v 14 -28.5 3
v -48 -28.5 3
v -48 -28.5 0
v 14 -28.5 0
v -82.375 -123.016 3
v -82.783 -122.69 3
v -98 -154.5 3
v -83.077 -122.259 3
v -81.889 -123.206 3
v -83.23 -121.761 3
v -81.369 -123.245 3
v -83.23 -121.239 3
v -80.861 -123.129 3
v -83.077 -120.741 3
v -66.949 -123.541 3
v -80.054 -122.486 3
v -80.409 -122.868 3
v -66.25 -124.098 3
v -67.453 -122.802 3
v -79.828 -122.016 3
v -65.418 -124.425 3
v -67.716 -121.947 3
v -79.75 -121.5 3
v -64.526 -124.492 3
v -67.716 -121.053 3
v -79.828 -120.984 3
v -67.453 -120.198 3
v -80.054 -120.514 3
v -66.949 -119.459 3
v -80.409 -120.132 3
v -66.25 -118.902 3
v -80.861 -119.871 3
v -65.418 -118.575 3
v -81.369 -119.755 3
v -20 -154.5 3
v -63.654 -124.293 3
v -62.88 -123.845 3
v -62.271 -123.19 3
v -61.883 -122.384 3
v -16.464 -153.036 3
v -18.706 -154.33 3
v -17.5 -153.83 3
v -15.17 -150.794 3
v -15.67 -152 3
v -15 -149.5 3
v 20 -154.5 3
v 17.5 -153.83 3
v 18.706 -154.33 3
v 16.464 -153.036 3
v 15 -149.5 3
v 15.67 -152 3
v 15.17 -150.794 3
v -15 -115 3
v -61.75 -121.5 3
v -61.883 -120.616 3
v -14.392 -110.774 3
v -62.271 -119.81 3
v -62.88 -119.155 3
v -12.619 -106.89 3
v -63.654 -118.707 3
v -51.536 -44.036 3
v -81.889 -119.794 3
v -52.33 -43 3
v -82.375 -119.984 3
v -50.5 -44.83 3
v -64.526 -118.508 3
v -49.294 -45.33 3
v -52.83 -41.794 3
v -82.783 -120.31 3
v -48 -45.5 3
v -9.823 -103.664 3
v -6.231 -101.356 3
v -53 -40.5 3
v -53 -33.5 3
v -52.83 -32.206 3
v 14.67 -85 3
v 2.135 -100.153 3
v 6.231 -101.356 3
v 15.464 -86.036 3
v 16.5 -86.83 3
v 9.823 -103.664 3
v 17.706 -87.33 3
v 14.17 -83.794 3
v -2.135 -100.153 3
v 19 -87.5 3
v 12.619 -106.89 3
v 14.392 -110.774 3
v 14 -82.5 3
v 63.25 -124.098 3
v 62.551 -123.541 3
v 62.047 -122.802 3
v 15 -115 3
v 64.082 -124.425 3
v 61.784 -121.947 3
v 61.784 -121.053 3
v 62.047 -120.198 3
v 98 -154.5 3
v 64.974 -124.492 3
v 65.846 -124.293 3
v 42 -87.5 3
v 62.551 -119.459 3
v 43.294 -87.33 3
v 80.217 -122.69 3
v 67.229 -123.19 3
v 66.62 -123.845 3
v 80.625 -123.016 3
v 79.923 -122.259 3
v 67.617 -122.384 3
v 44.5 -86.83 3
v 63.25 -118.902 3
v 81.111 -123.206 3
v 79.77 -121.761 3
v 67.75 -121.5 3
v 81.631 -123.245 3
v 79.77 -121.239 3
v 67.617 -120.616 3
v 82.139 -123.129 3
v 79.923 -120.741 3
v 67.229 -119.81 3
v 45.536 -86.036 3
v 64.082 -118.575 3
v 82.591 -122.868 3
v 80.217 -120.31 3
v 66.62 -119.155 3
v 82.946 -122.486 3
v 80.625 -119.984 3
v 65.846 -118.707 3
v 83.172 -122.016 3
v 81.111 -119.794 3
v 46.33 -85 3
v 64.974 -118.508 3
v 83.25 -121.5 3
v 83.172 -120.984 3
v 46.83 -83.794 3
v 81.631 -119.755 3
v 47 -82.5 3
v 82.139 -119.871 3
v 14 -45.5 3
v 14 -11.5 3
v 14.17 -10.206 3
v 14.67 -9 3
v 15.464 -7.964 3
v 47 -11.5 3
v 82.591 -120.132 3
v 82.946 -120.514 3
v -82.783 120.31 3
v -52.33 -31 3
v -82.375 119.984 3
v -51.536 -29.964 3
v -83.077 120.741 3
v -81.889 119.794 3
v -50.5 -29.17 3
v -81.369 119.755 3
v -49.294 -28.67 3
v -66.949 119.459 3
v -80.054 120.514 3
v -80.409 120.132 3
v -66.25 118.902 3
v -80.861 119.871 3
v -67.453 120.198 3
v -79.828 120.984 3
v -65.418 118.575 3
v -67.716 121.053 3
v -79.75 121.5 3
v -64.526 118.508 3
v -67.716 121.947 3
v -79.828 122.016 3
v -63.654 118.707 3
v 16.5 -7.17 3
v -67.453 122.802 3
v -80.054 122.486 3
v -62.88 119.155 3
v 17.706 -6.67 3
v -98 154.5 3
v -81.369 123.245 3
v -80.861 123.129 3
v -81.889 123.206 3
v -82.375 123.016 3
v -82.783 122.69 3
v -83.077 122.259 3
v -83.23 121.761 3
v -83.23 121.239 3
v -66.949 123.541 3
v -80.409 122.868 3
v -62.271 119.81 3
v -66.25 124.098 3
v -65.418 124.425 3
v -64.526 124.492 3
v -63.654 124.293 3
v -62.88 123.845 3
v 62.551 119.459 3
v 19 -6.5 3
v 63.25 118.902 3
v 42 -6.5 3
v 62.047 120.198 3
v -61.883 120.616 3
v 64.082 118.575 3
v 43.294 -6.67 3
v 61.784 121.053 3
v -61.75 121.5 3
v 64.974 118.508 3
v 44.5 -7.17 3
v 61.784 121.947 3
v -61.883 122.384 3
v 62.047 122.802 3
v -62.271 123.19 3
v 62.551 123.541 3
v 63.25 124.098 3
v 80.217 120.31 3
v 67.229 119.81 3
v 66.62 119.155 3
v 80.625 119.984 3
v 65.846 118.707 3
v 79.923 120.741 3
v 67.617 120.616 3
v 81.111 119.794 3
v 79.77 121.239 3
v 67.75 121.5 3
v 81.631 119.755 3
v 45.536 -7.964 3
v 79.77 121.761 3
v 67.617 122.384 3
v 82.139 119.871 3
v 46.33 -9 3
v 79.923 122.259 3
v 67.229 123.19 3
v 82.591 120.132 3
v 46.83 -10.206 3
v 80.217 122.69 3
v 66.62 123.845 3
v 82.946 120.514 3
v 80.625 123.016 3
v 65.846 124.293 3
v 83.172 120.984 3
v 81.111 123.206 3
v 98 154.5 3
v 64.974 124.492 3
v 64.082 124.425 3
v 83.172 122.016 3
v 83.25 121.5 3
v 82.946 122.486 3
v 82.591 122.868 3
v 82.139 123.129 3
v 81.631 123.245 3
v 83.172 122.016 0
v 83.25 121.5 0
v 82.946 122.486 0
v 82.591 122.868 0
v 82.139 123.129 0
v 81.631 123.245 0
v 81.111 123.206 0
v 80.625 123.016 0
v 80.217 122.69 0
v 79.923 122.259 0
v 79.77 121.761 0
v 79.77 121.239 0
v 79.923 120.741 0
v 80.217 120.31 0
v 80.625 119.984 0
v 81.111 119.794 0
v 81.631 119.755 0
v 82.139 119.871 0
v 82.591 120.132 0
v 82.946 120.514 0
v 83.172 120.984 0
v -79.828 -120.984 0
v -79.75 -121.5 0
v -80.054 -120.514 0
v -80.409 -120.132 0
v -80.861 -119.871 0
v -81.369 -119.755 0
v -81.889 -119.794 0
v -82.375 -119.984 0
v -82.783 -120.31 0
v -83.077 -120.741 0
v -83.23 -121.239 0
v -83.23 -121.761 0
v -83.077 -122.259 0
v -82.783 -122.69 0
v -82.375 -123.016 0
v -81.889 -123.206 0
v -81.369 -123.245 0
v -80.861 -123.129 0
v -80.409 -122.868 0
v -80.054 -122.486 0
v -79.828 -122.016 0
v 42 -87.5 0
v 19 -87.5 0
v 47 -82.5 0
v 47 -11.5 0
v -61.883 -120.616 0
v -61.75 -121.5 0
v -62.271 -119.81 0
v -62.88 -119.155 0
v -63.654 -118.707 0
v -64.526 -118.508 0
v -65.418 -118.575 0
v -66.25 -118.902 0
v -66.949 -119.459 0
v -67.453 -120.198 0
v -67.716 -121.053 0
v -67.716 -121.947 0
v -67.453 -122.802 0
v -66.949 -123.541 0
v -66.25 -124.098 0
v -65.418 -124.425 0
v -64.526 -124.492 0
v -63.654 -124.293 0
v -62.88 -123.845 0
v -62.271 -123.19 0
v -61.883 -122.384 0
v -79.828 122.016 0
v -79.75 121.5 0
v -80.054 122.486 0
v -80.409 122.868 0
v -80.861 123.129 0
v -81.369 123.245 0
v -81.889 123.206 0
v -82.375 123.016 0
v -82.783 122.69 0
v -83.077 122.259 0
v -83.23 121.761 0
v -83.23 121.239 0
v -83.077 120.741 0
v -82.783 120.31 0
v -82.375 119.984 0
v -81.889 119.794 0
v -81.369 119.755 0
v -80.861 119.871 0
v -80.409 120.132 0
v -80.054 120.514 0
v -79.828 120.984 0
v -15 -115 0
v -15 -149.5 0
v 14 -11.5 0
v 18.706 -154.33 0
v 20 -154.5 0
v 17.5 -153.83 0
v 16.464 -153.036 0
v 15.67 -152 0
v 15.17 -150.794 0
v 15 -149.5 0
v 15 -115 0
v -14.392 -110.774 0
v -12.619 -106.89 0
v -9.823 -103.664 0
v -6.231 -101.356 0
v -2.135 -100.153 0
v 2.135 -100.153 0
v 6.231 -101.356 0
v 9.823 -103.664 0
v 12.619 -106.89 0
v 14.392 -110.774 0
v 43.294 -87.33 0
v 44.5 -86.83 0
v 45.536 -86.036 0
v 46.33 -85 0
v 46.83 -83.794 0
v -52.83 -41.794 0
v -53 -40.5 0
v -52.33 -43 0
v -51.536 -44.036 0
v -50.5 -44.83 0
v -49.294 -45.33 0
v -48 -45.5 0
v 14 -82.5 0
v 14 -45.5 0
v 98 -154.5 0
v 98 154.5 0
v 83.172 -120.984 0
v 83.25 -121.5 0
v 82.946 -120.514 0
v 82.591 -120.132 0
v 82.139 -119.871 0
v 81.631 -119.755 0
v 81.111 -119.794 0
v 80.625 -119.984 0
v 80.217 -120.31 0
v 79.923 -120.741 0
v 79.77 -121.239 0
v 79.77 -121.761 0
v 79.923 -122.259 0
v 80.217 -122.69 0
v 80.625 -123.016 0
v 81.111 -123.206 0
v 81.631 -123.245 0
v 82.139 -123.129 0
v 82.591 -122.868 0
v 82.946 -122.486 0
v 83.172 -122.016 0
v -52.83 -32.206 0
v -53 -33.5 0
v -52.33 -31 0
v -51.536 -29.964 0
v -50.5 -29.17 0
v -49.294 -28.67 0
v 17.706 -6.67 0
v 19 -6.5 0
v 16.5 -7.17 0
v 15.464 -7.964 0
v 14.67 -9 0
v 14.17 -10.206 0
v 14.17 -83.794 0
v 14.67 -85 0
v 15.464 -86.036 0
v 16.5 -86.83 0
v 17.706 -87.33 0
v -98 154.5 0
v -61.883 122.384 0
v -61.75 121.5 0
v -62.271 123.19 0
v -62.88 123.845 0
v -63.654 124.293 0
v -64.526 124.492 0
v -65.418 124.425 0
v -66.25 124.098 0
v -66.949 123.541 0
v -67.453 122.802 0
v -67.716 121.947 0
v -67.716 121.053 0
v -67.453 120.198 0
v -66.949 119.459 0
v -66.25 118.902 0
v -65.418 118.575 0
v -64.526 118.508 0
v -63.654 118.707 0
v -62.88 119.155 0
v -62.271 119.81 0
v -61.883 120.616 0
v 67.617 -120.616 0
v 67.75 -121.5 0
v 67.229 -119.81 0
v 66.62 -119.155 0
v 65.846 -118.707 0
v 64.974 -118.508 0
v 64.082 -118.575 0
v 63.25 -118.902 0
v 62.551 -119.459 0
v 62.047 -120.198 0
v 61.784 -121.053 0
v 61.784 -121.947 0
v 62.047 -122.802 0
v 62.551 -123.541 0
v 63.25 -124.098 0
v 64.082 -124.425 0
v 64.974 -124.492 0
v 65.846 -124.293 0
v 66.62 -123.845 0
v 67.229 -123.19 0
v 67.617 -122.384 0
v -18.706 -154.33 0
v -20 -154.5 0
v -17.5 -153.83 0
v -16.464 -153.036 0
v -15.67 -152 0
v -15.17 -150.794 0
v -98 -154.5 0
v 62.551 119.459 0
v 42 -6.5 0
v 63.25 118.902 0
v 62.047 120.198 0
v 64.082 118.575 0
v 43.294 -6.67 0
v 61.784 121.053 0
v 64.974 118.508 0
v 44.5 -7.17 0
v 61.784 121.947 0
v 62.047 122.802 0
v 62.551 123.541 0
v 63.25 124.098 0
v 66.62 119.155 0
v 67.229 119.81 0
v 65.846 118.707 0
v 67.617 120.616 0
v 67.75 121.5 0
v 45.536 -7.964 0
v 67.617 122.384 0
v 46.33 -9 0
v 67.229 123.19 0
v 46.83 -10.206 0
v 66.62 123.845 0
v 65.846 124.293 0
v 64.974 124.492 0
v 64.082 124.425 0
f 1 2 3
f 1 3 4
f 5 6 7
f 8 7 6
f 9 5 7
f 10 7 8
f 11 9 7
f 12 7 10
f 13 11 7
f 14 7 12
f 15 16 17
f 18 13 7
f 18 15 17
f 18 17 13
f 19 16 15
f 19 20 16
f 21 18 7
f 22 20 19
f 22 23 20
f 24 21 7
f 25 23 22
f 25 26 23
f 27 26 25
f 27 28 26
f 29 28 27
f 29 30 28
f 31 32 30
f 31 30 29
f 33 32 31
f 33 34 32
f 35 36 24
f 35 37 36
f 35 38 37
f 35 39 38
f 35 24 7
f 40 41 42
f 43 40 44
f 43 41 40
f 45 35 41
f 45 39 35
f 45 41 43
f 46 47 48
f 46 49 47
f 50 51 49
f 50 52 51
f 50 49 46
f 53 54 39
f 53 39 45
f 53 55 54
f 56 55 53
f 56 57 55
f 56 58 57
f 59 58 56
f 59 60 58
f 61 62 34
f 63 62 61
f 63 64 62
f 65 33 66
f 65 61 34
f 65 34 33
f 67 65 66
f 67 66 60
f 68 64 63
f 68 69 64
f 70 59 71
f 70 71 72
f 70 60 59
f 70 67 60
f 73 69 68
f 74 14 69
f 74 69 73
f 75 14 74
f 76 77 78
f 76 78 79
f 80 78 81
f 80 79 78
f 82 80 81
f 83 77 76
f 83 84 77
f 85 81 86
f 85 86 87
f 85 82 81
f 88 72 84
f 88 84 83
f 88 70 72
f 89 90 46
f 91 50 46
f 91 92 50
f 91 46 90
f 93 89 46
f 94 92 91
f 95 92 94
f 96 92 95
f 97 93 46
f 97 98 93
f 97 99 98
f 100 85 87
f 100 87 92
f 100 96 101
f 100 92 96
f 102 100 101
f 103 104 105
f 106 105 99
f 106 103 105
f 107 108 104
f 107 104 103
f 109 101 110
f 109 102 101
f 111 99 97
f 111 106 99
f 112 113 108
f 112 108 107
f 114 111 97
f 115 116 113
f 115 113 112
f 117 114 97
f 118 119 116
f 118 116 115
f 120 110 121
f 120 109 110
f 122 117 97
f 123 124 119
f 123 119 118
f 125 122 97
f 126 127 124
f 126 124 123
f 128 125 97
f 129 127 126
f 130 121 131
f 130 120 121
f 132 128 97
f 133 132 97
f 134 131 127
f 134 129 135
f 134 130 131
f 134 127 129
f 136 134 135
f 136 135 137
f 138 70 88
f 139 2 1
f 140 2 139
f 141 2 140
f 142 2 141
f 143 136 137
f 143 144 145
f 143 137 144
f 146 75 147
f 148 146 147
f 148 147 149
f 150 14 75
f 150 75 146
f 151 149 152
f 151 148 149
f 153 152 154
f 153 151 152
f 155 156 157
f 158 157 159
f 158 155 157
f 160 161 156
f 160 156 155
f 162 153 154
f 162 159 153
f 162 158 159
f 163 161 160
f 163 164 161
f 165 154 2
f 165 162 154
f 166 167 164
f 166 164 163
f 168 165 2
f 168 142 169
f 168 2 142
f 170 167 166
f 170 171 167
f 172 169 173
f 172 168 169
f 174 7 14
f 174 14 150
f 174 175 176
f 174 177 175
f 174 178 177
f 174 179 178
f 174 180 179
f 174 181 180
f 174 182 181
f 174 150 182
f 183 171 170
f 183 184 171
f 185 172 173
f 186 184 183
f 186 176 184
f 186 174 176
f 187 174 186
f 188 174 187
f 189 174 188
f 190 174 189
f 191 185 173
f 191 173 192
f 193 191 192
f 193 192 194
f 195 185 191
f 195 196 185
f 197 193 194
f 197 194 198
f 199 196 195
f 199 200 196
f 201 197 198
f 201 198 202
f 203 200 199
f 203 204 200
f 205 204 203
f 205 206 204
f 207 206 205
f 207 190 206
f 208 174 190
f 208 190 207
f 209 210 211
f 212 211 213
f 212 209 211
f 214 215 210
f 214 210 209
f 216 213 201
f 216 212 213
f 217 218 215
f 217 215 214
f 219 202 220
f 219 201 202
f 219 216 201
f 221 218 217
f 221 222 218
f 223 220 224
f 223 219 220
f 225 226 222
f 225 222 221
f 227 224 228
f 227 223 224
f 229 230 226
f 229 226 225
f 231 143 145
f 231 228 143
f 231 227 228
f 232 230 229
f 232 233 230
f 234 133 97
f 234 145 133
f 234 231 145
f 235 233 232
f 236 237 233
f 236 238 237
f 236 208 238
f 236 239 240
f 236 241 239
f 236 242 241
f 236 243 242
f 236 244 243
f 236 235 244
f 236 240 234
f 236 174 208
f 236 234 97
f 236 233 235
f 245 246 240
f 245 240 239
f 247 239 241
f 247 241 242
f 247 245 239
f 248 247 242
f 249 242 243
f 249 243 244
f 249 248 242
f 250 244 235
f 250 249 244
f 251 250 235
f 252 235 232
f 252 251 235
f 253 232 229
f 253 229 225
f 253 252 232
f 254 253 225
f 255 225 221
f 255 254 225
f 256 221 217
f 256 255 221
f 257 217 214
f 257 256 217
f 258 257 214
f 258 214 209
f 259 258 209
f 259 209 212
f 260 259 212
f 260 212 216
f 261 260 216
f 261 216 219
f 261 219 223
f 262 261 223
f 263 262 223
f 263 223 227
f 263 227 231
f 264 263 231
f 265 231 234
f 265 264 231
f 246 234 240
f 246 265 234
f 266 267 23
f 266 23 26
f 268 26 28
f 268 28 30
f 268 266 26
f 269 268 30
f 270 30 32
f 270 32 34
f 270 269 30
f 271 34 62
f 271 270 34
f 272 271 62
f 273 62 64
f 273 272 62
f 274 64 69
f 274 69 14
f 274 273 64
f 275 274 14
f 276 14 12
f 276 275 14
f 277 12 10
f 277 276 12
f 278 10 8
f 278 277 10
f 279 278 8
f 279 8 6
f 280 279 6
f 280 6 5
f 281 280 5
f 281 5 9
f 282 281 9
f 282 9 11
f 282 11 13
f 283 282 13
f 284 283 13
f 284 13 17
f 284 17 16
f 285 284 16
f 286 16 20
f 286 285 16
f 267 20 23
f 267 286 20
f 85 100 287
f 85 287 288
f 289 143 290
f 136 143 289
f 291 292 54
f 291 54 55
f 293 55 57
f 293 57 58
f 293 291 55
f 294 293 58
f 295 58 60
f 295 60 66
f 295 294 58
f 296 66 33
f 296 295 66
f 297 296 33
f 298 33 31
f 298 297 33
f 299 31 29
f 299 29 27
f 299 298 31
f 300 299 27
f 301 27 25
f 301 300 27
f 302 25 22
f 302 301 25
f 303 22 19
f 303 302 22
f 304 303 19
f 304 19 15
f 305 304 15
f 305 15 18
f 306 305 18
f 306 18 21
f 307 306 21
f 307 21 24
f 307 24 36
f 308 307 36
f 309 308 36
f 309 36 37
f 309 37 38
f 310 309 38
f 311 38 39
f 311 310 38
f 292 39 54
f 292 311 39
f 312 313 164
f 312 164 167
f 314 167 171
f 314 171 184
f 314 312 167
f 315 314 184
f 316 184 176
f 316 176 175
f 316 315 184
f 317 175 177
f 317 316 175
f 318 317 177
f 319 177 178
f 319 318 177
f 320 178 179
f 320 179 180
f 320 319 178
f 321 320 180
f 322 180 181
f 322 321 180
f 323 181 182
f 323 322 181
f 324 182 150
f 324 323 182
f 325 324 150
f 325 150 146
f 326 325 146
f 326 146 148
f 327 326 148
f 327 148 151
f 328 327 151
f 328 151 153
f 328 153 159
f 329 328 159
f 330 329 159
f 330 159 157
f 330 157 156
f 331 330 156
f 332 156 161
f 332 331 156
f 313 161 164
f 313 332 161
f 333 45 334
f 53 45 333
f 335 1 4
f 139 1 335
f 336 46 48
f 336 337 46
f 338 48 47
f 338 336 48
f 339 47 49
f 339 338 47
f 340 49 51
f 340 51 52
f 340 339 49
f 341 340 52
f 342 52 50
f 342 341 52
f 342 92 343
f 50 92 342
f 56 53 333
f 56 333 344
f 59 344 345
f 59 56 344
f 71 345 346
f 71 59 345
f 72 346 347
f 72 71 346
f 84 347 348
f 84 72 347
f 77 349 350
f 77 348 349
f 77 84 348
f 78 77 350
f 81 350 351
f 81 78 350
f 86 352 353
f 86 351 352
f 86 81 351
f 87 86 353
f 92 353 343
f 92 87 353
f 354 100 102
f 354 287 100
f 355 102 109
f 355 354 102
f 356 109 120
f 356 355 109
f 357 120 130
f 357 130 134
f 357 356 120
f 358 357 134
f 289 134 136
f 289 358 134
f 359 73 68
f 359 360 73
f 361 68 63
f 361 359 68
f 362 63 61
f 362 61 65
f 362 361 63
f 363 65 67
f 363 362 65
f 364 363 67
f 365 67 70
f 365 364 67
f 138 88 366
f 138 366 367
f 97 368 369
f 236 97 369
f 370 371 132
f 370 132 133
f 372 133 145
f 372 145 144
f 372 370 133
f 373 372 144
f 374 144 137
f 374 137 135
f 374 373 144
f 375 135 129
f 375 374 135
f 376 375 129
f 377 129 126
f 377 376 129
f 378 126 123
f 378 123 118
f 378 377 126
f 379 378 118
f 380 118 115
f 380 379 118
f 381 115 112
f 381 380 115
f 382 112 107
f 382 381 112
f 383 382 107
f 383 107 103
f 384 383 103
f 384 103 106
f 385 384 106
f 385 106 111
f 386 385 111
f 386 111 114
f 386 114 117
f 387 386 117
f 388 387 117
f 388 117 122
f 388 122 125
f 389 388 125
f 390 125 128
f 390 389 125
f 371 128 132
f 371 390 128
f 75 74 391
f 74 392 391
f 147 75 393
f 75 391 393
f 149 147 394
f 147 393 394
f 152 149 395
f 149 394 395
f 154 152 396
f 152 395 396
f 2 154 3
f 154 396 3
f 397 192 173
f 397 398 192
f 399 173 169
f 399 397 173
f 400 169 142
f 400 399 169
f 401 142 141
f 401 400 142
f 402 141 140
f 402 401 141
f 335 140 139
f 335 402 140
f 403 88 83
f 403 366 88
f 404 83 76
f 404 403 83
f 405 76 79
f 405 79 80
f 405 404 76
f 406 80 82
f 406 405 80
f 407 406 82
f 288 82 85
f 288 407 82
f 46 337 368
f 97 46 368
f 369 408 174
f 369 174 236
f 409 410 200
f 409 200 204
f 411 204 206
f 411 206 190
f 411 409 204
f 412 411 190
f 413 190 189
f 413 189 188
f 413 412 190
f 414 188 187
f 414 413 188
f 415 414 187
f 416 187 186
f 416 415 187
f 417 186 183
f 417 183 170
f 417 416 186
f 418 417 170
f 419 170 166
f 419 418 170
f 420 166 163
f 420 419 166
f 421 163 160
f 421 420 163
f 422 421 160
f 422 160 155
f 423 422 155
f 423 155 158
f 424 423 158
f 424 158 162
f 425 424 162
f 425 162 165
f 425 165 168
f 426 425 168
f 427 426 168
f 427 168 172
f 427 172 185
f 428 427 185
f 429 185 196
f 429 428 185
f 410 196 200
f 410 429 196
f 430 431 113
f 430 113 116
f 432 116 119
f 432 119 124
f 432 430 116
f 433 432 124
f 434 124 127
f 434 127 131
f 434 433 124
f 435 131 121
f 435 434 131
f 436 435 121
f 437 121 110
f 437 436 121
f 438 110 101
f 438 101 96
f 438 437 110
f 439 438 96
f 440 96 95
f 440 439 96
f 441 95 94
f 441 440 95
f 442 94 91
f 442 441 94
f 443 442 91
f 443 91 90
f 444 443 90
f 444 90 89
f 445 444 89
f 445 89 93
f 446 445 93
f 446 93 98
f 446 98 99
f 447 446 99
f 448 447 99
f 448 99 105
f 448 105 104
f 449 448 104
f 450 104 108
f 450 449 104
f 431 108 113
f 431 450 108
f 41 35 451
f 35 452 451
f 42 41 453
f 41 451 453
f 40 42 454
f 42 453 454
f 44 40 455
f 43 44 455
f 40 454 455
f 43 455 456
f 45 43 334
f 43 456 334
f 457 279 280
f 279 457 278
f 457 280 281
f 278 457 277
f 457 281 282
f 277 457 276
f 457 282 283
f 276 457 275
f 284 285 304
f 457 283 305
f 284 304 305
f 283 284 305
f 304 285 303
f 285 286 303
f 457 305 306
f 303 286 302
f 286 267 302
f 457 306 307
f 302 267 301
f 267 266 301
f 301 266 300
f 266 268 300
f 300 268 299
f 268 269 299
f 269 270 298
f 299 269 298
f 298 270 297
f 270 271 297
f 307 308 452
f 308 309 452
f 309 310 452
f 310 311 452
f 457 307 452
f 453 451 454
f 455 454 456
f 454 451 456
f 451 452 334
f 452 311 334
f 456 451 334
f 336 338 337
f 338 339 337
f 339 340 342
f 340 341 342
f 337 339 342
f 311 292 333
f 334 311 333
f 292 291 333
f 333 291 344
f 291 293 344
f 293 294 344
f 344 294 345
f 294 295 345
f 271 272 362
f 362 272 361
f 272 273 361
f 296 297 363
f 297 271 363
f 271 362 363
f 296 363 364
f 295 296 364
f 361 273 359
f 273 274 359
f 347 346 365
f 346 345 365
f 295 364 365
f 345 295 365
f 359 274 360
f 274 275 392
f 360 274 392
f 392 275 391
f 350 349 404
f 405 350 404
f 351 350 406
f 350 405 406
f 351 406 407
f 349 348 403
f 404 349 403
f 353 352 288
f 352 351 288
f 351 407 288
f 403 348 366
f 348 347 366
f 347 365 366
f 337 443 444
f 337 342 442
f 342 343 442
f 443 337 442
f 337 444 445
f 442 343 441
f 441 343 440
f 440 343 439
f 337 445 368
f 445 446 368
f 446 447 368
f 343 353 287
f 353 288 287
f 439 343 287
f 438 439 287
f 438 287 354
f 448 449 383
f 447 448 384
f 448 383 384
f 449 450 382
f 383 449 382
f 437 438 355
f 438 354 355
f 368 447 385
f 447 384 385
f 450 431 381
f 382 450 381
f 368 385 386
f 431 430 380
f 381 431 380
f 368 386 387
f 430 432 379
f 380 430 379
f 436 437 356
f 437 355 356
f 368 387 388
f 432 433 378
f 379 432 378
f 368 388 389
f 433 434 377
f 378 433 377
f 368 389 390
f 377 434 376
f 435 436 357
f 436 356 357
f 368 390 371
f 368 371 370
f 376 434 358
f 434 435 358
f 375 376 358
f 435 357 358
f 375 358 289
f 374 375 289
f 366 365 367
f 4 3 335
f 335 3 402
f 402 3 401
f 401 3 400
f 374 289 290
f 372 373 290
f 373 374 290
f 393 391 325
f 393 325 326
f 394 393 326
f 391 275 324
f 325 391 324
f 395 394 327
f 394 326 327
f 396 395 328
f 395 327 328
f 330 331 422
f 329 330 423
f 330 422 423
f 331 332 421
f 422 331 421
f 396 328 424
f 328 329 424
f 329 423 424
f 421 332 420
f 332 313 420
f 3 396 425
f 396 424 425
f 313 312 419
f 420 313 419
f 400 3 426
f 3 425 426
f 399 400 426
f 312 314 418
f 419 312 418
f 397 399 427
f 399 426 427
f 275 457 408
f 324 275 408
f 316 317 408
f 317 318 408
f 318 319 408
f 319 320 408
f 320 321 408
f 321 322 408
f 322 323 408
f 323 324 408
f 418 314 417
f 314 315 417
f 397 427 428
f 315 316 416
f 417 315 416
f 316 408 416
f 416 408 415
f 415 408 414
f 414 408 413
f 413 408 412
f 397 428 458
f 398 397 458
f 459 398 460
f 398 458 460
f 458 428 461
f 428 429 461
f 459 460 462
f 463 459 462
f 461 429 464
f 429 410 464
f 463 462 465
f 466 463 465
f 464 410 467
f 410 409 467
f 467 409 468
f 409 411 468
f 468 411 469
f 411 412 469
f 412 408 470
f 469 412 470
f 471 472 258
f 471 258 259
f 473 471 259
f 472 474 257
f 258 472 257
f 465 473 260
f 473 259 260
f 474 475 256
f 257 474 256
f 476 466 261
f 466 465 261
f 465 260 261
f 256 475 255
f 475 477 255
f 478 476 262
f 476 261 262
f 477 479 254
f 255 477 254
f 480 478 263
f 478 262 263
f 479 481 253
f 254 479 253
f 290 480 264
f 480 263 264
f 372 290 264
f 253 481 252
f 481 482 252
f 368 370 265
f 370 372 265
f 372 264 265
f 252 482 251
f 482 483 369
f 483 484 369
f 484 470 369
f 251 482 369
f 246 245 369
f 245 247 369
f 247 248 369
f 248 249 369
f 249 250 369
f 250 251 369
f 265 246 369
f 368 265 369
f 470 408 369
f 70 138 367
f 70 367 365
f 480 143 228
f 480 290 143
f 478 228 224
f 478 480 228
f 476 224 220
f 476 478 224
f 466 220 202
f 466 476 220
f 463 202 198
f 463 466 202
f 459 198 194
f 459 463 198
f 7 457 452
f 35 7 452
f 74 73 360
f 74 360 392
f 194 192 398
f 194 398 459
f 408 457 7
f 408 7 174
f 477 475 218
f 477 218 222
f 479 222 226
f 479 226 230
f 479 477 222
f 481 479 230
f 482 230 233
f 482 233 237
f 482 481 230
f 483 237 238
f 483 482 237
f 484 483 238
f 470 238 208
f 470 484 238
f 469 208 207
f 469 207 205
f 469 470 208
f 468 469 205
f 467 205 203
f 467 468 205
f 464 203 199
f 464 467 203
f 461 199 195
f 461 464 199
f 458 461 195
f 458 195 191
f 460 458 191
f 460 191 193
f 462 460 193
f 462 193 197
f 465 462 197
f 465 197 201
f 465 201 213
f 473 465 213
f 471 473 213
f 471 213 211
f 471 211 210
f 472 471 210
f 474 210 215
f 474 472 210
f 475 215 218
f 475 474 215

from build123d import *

# Parameters (mm, degrees)
ESQUISSE1_W             = 196
ESQUISSE1_H             = 309
ESQUISSE1_R             = 1.75
ESQUISSE1_R_2           = 3
BOSS_EXTRU_1_DEPTH      = 3
ENL_V_MAT_EXTRU_1_REACH = 5
CONG_1_R                = 5
ENL_V_MAT_EXTRU_2_DEPTH = 4
CONG_2_R                = 5


with BuildPart() as part:
    # Esquisse1 → Boss.-Extru.1 (new body)
    with BuildSketch(Plane.XY):
        Rectangle(ESQUISSE1_W, ESQUISSE1_H)
        with Locations((-81.5, 121.5)):
            Circle(ESQUISSE1_R, mode=Mode.SUBTRACT)
        with Locations((81.5, 121.5)):
            Circle(ESQUISSE1_R, mode=Mode.SUBTRACT)
        with Locations((81.5, -121.5)):
            Circle(ESQUISSE1_R, mode=Mode.SUBTRACT)
        with Locations((-81.5, -121.5)):
            Circle(ESQUISSE1_R, mode=Mode.SUBTRACT)
        with Locations((64.75, 121.5)):
            Circle(ESQUISSE1_R_2, mode=Mode.SUBTRACT)
        with Locations((-64.75, 121.5)):
            Circle(ESQUISSE1_R_2, mode=Mode.SUBTRACT)
        with Locations((-64.75, -121.5)):
            Circle(ESQUISSE1_R_2, mode=Mode.SUBTRACT)
        with Locations((64.75, -121.5)):
            Circle(ESQUISSE1_R_2, mode=Mode.SUBTRACT)
    extrude(amount=BOSS_EXTRU_1_DEPTH)

    # Esquisse2 → Enlèv. mat.-Extru.1 (cut, up to next)
    with BuildSketch(Plane.XY.offset(3), mode=Mode.PRIVATE) as enl_v_mat_extru_1_sk1:
        with BuildLine():
            Line((-15, -154.5), (-15, -115))
            ThreePointArc((-15, -115), (0, -100), (15, -115))
            Line((15, -115), (15, -154.5))
            ThreePointArc((15, -154.5), (0, -169.5), (-15, -154.5))
        make_face()
    enl_v_mat_extru_1_tool1 = extrude(enl_v_mat_extru_1_sk1.sketch, amount=-ENL_V_MAT_EXTRU_1_REACH, mode=Mode.PRIVATE) & part.part
    add(enl_v_mat_extru_1_tool1.solids().sort_by_distance((0, -134.75, 3))[0], mode=Mode.SUBTRACT)

    # Congé1
    cong_1_edges = [part.edges().sort_by_distance(p)[0] for p in [
        (-15, -154.5, 1.5),
        (15, -154.5, 1.5),
    ]]
    fillet(cong_1_edges, radius=CONG_1_R)

    # Esquisse3 → Enlèv. mat.-Extru.2 (cut, through all)
    with BuildSketch(Plane.XY.offset(3)):
        Polygon((-53, -28.5), (14, -28.5), (14, -6.5), (47, -6.5), (47, -87.5), (14, -87.5), (14, -45.5), (-53, -45.5), align=None)
    extrude(amount=-ENL_V_MAT_EXTRU_2_DEPTH, mode=Mode.SUBTRACT)

    # Congé2
    cong_2_edges = [part.edges().sort_by_distance(p)[0] for p in [
        (-53, -45.5, 1.5),
        (-53, -28.5, 1.5),
        (14, -6.5, 1.5),
        (47, -6.5, 1.5),
        (47, -87.5, 1.5),
        (14, -87.5, 1.5),
    ]]
    fillet(cong_2_edges, radius=CONG_2_R)


solid = part.part
